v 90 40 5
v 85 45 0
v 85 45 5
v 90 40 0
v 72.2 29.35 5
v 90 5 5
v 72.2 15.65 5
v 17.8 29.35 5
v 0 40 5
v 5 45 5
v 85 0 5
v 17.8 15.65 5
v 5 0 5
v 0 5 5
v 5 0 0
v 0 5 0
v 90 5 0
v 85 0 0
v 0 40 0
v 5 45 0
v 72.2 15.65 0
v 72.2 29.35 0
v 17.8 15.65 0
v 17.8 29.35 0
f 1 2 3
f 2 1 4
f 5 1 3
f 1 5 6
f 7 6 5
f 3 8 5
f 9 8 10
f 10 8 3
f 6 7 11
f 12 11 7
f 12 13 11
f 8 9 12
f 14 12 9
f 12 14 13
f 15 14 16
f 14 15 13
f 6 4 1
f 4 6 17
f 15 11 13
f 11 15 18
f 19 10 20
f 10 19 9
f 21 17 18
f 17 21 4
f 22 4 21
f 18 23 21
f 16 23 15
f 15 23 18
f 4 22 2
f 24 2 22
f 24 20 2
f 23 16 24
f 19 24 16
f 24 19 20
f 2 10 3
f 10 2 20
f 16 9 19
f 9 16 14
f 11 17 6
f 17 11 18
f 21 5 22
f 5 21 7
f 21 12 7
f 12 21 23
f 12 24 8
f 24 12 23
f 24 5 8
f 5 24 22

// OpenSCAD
$fn = 32;

// ----------------------------------------------------------------------
// Windowed plate: 1 voids, 90 x 45 x 5 mm
// ----------------------------------------------------------------------

// --- parameters (mm) ---
plate_l = 90;             // plate length, X
plate_w = 45;             // plate width, Y
plate_t = 5;              // plate thickness, Z
edge_margin = 12;         // wall from the plate edge to any window
win1_l = 54.4;            // window length
win1_w = 13.7;            // window width
depth_1 = 5;              // depth of void 1 (full thickness = through)
corner_c = 5;             // corner chamfer of the plate

profile = [[5, 0], [85, 0], [90, 5], [90, 40], [85, 45], [5, 45], [0, 40], [0, 5]];  // primary outline, 8 points, counter clockwise
void_1 = [[17.8, 15.65], [72.2, 15.65], [72.2, 29.35], [17.8, 29.35]];  // large central window, 4 points

// --- the one profile operation ---
difference() {
  linear_extrude(height = plate_t) polygon(points = profile);
  translate([0, 0, -1])
    linear_extrude(height = plate_t + 2) polygon(points = void_1);
}
